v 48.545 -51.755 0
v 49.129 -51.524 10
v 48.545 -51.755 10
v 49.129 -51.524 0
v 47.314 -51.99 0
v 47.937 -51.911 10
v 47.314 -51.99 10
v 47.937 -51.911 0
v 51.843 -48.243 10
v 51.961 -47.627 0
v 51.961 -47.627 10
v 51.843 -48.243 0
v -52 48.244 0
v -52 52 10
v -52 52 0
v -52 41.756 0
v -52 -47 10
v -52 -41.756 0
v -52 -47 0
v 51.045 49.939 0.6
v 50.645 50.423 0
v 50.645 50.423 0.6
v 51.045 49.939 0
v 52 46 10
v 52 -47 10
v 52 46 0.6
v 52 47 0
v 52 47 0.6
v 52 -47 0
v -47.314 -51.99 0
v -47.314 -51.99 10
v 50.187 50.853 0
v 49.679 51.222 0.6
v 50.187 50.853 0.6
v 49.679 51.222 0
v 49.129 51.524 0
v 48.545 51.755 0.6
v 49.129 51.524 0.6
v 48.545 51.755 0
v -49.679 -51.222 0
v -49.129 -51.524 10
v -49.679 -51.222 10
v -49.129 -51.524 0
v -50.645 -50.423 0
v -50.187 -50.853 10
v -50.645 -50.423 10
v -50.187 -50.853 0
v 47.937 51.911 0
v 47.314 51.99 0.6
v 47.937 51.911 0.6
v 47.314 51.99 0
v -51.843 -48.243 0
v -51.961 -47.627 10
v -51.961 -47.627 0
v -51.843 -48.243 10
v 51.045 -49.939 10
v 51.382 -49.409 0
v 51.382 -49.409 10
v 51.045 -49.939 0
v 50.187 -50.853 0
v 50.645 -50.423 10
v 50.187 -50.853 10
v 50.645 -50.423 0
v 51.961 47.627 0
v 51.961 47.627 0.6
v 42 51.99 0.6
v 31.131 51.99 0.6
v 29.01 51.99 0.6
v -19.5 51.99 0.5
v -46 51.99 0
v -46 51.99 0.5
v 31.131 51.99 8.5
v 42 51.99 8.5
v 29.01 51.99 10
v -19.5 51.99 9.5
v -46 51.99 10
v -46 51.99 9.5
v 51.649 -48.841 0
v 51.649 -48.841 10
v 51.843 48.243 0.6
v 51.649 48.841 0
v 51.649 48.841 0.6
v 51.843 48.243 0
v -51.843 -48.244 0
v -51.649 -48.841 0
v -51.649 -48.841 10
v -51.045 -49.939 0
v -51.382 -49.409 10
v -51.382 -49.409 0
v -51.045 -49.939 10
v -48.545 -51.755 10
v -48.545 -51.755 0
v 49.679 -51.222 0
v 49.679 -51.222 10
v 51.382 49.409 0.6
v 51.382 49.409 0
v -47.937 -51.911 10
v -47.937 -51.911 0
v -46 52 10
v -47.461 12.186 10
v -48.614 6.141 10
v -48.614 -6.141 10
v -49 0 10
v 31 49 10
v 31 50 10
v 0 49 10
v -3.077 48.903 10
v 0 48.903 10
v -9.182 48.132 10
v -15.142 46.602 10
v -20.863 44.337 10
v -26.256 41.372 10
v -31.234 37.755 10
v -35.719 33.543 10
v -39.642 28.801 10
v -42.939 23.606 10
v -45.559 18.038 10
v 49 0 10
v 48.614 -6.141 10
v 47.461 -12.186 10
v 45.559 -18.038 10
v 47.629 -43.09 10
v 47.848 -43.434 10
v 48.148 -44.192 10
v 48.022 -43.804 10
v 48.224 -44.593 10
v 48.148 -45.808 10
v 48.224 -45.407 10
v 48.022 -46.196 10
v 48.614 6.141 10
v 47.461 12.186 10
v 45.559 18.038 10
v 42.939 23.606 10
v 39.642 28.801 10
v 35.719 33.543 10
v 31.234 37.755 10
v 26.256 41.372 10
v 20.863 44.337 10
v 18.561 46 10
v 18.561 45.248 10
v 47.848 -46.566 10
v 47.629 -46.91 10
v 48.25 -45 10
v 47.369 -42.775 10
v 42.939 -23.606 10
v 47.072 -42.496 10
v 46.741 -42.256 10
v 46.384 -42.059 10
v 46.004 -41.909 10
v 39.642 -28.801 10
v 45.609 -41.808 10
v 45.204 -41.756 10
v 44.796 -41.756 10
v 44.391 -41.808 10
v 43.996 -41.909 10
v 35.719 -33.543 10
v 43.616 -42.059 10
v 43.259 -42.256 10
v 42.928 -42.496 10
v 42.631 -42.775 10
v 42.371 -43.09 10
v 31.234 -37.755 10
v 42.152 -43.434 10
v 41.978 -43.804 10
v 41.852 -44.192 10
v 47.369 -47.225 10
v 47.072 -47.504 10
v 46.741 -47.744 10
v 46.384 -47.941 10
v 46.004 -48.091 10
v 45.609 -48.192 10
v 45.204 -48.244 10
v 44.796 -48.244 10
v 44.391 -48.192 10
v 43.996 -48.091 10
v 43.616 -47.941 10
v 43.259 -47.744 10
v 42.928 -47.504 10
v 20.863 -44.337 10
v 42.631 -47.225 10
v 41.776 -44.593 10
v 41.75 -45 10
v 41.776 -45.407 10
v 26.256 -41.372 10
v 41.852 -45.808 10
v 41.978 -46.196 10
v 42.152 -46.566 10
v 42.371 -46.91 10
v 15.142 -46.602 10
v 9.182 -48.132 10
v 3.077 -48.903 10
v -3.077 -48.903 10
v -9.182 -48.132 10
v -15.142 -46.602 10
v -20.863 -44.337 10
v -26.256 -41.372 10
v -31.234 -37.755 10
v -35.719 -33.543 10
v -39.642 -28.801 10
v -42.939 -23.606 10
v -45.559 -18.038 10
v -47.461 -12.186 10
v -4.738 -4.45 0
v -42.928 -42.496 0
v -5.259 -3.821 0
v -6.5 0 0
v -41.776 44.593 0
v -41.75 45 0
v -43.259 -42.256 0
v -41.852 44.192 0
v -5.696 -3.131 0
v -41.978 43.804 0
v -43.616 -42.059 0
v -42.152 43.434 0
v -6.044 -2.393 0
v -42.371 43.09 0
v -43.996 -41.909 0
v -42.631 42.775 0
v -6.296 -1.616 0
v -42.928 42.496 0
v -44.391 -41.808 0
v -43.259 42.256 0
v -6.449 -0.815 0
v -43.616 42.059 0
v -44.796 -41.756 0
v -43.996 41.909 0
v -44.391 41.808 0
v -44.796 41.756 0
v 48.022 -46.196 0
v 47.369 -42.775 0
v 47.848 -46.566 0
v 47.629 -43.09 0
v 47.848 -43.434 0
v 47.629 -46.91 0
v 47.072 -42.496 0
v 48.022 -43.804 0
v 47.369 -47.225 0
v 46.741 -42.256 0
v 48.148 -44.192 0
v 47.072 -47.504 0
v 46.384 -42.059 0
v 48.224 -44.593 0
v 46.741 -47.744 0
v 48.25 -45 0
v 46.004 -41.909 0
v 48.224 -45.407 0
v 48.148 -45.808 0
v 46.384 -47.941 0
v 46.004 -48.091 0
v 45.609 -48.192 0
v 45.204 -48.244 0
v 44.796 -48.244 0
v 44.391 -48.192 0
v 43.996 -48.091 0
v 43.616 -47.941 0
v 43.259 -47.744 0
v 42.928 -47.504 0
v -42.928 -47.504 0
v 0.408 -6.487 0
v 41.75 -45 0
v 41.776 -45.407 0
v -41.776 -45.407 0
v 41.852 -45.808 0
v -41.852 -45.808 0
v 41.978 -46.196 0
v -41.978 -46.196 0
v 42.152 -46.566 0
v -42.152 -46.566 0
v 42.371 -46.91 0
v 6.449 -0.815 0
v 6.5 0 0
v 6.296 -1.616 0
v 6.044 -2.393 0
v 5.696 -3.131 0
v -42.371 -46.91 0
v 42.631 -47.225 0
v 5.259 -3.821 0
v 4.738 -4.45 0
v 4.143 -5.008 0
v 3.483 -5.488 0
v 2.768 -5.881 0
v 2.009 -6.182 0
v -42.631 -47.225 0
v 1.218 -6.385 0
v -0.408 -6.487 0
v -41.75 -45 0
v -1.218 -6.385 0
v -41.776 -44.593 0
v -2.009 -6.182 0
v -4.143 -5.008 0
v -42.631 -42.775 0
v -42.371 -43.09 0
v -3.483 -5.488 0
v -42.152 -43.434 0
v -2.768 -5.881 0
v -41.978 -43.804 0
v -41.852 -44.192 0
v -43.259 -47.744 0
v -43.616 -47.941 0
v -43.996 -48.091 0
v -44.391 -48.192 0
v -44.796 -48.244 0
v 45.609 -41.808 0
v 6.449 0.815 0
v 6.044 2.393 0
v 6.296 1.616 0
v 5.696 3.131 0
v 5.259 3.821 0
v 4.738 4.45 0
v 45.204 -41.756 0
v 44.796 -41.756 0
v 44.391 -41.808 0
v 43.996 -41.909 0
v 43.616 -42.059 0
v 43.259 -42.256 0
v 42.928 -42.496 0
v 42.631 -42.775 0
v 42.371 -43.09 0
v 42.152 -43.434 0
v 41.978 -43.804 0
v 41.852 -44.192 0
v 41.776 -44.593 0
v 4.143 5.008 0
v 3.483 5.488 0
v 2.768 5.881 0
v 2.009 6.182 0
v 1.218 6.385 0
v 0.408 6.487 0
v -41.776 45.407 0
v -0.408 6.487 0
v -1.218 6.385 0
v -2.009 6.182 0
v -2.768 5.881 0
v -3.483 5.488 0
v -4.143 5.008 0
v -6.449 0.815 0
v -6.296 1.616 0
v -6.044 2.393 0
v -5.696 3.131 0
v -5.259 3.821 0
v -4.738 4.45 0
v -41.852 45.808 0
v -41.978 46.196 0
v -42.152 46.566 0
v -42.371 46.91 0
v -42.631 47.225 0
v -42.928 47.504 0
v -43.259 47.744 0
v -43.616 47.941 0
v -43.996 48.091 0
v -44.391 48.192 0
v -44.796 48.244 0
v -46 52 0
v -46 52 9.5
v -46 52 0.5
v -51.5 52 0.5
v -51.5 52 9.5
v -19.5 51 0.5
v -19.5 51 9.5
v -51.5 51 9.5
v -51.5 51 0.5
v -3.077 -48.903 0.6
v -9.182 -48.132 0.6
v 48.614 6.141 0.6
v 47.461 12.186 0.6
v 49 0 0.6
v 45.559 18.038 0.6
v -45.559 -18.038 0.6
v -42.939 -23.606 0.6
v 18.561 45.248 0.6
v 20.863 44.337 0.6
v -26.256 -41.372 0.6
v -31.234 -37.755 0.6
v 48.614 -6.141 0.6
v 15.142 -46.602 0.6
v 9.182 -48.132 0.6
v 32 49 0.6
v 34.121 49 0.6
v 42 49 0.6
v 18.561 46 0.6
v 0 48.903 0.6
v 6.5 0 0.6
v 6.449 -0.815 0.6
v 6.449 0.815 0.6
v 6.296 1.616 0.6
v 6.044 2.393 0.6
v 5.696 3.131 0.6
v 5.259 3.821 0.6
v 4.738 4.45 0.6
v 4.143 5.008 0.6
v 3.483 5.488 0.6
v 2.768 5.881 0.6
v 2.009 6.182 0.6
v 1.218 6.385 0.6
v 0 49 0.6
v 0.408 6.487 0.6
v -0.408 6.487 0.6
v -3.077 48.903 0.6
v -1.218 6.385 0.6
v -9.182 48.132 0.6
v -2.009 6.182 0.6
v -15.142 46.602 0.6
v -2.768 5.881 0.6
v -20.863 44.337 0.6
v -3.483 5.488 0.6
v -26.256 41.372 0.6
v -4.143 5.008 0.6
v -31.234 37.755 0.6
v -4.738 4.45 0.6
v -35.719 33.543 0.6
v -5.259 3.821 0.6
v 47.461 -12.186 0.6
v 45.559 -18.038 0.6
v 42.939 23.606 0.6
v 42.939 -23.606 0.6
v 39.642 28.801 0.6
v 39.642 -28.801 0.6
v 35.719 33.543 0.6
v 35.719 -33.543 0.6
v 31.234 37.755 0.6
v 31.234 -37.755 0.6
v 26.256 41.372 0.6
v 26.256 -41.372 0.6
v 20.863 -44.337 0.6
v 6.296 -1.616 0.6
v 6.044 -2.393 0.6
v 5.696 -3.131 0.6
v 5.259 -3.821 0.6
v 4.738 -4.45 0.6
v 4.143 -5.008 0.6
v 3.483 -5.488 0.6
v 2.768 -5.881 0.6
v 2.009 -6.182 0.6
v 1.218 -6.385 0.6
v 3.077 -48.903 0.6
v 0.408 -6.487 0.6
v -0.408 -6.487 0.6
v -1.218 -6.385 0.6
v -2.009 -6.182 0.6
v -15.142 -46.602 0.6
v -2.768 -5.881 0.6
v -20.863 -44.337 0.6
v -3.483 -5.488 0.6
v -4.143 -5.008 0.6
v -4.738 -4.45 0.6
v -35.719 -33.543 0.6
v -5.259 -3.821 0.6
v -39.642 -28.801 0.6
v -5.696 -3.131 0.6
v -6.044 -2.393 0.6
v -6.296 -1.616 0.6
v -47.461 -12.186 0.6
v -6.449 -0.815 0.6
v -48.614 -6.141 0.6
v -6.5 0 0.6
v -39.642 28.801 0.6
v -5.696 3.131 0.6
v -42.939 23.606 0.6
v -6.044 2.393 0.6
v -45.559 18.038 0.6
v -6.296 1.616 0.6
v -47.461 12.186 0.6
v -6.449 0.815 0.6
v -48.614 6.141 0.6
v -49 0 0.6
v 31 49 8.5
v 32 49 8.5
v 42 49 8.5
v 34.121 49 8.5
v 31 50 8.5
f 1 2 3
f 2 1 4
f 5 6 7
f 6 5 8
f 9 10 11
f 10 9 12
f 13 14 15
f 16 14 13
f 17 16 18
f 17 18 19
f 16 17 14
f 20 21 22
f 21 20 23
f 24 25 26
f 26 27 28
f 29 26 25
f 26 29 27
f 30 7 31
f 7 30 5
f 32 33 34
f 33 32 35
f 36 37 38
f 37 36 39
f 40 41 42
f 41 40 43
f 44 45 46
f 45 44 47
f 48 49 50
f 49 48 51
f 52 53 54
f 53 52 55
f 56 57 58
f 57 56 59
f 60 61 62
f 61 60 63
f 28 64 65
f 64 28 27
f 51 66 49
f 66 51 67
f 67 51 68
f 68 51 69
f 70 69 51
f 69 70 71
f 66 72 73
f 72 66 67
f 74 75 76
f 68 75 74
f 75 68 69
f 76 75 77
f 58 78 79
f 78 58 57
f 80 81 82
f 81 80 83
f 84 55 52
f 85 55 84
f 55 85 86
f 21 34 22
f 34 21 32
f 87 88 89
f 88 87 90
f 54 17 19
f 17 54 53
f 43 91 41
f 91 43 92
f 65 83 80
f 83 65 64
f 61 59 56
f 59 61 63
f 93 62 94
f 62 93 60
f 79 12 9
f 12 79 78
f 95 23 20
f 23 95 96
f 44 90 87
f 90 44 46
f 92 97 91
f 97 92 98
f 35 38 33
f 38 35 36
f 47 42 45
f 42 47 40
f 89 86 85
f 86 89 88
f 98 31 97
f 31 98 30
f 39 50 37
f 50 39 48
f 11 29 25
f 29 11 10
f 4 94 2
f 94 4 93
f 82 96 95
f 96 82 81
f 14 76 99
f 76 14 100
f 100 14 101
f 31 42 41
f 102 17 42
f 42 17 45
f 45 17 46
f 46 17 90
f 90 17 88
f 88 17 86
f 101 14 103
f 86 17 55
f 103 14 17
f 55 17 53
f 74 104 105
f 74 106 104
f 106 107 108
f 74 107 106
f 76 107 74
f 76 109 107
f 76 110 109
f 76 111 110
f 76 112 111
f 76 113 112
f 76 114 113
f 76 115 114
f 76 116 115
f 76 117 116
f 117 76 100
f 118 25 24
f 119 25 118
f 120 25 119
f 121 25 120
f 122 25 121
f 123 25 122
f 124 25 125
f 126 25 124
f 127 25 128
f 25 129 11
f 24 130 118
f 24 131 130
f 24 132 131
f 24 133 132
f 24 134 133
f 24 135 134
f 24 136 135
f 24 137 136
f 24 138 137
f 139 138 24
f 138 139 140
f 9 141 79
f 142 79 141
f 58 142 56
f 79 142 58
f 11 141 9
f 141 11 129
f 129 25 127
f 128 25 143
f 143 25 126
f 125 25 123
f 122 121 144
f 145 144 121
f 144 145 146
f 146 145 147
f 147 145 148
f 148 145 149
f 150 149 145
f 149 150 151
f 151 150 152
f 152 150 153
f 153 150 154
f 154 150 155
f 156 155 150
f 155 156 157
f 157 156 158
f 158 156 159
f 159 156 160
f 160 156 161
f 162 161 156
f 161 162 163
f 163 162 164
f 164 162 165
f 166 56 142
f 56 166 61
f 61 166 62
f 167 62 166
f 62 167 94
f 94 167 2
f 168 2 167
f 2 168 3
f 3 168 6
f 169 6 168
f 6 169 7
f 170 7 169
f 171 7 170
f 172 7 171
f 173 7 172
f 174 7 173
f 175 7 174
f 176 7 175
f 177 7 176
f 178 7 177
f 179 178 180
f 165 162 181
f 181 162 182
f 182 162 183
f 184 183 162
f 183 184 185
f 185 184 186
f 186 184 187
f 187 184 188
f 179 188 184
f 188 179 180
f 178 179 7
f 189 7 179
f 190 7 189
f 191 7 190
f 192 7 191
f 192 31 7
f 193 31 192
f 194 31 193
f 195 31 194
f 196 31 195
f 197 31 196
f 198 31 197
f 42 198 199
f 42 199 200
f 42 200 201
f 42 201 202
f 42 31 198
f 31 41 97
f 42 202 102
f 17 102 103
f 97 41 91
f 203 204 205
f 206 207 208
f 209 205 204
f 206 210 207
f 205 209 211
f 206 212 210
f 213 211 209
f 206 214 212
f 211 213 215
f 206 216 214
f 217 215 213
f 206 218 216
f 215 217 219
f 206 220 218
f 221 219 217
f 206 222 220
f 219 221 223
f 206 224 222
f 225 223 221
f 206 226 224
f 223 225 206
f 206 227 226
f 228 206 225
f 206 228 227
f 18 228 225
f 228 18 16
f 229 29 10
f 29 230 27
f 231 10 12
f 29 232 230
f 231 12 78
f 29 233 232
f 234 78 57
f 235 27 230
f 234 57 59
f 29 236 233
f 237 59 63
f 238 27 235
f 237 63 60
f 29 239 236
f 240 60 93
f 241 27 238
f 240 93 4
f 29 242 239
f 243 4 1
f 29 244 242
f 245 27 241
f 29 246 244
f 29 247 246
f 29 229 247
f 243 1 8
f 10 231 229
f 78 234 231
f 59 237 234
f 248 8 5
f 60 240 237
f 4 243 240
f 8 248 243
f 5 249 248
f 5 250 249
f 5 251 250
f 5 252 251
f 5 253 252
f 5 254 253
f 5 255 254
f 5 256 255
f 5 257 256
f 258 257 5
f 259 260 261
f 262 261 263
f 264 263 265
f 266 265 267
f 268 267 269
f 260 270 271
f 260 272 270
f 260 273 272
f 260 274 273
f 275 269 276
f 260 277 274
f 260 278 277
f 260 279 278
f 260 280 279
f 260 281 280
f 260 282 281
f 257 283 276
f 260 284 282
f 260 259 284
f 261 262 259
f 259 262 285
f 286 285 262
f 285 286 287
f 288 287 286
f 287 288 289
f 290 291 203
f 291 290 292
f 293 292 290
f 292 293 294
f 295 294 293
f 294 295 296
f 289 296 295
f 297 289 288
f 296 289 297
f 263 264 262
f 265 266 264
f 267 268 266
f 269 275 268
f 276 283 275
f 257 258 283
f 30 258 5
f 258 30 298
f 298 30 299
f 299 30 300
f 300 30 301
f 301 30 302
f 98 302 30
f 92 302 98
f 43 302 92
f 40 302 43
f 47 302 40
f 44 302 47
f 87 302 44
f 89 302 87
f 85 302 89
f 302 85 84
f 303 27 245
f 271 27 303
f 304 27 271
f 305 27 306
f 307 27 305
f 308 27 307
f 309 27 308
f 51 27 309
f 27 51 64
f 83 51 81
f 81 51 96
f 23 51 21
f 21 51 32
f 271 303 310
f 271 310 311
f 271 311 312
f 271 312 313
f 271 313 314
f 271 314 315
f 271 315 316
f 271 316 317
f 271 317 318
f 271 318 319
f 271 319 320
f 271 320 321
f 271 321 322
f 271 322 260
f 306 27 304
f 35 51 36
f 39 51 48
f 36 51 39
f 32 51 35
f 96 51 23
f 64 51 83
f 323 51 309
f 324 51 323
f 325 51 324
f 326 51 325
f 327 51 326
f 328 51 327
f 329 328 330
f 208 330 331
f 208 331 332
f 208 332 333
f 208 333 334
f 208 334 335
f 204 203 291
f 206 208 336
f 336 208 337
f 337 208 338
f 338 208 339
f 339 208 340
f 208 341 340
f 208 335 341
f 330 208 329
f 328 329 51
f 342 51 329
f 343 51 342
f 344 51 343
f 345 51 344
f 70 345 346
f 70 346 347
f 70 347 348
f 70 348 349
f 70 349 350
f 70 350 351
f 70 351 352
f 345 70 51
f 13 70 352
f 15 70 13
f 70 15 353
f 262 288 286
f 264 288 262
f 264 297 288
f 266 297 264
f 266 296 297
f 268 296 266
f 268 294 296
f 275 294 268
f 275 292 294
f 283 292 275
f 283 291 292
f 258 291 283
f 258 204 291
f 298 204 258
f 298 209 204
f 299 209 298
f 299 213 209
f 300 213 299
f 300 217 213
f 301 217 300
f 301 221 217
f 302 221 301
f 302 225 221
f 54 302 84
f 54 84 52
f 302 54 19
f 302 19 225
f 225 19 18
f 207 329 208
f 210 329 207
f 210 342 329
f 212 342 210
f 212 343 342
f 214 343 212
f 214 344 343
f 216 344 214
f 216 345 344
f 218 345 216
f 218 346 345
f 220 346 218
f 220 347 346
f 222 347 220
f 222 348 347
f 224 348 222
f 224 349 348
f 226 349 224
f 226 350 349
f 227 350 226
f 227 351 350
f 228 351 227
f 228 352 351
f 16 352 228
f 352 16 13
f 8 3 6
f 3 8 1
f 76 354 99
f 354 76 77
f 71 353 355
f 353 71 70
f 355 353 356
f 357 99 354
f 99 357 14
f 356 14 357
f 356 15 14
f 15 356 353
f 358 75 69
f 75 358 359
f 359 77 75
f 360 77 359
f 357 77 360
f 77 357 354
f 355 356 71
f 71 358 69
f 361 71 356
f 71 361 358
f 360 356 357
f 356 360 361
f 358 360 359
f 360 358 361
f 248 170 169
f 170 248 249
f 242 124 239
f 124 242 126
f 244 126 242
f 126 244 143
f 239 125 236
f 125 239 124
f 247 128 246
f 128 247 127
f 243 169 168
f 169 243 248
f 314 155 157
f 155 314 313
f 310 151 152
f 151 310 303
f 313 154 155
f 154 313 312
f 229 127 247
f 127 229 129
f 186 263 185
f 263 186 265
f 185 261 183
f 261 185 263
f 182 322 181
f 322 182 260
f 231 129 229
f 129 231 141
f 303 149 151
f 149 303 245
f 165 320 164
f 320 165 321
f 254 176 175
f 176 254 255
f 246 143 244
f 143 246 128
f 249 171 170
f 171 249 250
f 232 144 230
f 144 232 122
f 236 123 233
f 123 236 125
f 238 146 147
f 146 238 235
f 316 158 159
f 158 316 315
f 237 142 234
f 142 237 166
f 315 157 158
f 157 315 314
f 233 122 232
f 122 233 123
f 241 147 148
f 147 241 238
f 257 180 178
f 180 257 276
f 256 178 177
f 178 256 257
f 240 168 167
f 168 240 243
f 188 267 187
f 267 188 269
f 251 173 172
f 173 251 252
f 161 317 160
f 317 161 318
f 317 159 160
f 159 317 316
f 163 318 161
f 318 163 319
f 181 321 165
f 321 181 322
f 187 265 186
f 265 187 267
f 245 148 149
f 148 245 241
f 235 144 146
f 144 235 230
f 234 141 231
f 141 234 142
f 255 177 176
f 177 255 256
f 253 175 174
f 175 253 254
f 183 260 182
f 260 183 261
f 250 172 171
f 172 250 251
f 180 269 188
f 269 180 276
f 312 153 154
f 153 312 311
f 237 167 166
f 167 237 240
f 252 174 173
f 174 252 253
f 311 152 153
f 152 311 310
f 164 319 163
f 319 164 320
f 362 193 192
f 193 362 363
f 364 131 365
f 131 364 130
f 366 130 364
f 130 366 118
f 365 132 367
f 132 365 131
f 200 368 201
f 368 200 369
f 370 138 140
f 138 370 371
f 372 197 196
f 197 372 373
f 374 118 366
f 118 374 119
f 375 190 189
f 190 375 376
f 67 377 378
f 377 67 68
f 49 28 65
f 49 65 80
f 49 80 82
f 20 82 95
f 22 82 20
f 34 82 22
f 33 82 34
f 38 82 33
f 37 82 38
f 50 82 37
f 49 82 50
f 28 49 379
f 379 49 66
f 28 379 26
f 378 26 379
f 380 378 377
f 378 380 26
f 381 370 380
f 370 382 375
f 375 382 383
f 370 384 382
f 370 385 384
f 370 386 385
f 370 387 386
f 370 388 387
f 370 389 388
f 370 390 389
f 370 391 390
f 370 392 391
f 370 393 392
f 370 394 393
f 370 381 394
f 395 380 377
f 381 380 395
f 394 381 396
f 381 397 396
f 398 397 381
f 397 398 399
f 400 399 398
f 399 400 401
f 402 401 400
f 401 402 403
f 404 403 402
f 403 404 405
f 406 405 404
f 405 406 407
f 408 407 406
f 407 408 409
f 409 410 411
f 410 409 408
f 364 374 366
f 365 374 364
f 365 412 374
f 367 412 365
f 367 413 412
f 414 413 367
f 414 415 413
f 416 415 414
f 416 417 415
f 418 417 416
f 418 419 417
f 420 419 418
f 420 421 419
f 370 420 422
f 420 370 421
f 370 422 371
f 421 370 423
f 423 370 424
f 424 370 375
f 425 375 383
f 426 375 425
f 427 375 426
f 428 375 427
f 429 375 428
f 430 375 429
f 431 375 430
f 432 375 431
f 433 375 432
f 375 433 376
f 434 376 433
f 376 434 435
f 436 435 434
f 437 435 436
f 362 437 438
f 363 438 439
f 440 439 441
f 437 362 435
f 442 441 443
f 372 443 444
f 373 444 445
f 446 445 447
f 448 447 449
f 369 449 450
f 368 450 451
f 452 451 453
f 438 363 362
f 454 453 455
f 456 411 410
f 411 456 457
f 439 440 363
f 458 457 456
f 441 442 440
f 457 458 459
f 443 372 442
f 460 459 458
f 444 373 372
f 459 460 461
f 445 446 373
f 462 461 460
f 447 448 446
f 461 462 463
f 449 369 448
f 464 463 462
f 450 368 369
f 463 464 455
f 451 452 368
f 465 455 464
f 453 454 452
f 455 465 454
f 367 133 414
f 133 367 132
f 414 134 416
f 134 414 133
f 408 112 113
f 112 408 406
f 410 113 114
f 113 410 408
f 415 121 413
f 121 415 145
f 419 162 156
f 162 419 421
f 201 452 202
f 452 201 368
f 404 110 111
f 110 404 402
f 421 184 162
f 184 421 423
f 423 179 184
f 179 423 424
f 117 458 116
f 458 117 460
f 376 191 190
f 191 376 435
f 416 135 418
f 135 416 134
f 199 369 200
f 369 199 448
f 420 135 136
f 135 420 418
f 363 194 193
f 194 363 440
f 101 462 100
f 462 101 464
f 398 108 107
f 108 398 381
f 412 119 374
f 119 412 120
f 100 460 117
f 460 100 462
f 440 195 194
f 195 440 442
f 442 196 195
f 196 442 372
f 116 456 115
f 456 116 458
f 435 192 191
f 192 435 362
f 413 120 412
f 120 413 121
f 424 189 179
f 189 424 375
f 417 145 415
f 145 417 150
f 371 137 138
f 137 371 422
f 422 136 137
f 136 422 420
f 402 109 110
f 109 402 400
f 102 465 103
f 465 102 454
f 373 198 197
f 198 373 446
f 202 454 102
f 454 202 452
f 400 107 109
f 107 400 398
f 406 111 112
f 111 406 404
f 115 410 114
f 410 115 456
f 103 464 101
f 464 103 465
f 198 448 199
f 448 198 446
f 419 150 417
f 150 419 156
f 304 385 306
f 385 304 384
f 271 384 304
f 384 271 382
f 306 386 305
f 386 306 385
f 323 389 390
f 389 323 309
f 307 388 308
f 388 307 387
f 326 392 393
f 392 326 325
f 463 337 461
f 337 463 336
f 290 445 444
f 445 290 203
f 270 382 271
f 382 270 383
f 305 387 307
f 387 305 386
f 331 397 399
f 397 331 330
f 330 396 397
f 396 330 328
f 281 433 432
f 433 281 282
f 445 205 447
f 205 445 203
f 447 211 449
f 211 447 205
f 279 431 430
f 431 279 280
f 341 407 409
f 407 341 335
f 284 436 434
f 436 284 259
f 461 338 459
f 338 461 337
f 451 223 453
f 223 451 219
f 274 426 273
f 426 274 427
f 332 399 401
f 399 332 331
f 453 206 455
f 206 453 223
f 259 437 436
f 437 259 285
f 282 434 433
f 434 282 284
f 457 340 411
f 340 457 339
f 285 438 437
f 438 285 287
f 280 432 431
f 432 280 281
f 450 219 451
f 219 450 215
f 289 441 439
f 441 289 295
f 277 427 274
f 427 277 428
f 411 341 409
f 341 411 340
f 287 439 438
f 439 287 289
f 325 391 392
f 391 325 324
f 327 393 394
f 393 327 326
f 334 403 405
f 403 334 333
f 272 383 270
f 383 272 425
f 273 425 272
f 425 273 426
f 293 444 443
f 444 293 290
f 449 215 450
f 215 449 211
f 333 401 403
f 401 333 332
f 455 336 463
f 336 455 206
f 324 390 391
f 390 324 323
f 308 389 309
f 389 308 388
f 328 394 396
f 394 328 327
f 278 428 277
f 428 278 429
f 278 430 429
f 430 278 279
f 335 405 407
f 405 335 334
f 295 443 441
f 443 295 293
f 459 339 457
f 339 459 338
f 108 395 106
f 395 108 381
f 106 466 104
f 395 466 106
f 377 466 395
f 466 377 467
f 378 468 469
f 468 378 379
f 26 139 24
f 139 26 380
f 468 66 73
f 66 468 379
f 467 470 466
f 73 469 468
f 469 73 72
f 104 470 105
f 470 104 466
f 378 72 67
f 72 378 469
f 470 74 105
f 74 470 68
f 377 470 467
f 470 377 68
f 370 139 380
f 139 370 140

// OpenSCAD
$fn = 50;


difference() {
	union() {
		hull() {
			translate(v = [-47.0000000000, 47.0000000000, 0]) {
				cylinder(h = 10, r = 5);
			}
			translate(v = [47.0000000000, 47.0000000000, 0]) {
				cylinder(h = 10, r = 5);
			}
			translate(v = [-47.0000000000, -47.0000000000, 0]) {
				cylinder(h = 10, r = 5);
			}
			translate(v = [47.0000000000, -47.0000000000, 0]) {
				cylinder(h = 10, r = 5);
			}
		}
		translate(v = [-52.0000000000, 46.0000000000, 0]) {
			cube(size = [6, 6, 10]);
		}
	}
	union() {
		translate(v = [-52.5000000000, -45.0000000000, -250.0000000000]) {
			rotate(a = [0, 0, 0]) {
				difference() {
					union() {
						hull() {
							translate(v = [7.5000000000, 0, 0]) {
								cylinder(h = 250, r = 3.2500000000, r1 = 3.2500000000, r2 = 3.2500000000);
							}
							translate(v = [-7.5000000000, 0, 0]) {
								cylinder(h = 250, r = 3.2500000000, r1 = 3.2500000000, r2 = 3.2500000000);
							}
						}
					}
					union();
				}
			}
		}
		translate(v = [-52.5000000000, 45.0000000000, -250.0000000000]) {
			rotate(a = [0, 0, 0]) {
				difference() {
					union() {
						hull() {
							translate(v = [7.5000000000, 0, 0]) {
								cylinder(h = 250, r = 3.2500000000, r1 = 3.2500000000, r2 = 3.2500000000);
							}
							translate(v = [-7.5000000000, 0, 0]) {
								cylinder(h = 250, r = 3.2500000000, r1 = 3.2500000000, r2 = 3.2500000000);
							}
						}
					}
					union();
				}
			}
		}
		translate(v = [-51.5000000000, 51.0000000000, 0.5000000000]) {
			cube(size = [32, 1, 9.0000000000]);
		}
		translate(v = [45.0000000000, -45.0000000000, -50.0000000000]) {
			cylinder(h = 100, r = 3.2500000000);
		}
		translate(v = [0, 0, 0.6000000000]) {
			cylinder(h = 12.4000000000, r = 49.0000000000);
		}
		translate(v = [0, 0, -5.0000000000]) {
			cylinder(h = 10, r = 6.5000000000);
		}
		translate(v = [0.0000000000, 46.0000000000, 0.6000000000]) {
			cube(size = [52.0000000000, 3, 12.4000000000]);
		}
		translate(v = [42.0000000000, 46.0000000000, 0.6000000000]) {
			cube(size = [10, 6, 12.4000000000]);
		}
		translate(v = [31.0000000000, 46.0000000000, 8.5000000000]) {
			cube(size = [21, 6, 1.5000000000]);
		}
		translate(v = [28.2500000000, 52.7500000000, 0.6000000000]) {
			rotate(a = [0, 0, -45]) {
				cube(size = [7.5000000000, 1.5000000000, 12.4000000000]);
			}
		}
		translate(v = [11.0610000000, 44.0000000000, 0.6000000000]) {
			cube(size = [7.5000000000, 2, 9.4000000000]);
		}
	}
}
